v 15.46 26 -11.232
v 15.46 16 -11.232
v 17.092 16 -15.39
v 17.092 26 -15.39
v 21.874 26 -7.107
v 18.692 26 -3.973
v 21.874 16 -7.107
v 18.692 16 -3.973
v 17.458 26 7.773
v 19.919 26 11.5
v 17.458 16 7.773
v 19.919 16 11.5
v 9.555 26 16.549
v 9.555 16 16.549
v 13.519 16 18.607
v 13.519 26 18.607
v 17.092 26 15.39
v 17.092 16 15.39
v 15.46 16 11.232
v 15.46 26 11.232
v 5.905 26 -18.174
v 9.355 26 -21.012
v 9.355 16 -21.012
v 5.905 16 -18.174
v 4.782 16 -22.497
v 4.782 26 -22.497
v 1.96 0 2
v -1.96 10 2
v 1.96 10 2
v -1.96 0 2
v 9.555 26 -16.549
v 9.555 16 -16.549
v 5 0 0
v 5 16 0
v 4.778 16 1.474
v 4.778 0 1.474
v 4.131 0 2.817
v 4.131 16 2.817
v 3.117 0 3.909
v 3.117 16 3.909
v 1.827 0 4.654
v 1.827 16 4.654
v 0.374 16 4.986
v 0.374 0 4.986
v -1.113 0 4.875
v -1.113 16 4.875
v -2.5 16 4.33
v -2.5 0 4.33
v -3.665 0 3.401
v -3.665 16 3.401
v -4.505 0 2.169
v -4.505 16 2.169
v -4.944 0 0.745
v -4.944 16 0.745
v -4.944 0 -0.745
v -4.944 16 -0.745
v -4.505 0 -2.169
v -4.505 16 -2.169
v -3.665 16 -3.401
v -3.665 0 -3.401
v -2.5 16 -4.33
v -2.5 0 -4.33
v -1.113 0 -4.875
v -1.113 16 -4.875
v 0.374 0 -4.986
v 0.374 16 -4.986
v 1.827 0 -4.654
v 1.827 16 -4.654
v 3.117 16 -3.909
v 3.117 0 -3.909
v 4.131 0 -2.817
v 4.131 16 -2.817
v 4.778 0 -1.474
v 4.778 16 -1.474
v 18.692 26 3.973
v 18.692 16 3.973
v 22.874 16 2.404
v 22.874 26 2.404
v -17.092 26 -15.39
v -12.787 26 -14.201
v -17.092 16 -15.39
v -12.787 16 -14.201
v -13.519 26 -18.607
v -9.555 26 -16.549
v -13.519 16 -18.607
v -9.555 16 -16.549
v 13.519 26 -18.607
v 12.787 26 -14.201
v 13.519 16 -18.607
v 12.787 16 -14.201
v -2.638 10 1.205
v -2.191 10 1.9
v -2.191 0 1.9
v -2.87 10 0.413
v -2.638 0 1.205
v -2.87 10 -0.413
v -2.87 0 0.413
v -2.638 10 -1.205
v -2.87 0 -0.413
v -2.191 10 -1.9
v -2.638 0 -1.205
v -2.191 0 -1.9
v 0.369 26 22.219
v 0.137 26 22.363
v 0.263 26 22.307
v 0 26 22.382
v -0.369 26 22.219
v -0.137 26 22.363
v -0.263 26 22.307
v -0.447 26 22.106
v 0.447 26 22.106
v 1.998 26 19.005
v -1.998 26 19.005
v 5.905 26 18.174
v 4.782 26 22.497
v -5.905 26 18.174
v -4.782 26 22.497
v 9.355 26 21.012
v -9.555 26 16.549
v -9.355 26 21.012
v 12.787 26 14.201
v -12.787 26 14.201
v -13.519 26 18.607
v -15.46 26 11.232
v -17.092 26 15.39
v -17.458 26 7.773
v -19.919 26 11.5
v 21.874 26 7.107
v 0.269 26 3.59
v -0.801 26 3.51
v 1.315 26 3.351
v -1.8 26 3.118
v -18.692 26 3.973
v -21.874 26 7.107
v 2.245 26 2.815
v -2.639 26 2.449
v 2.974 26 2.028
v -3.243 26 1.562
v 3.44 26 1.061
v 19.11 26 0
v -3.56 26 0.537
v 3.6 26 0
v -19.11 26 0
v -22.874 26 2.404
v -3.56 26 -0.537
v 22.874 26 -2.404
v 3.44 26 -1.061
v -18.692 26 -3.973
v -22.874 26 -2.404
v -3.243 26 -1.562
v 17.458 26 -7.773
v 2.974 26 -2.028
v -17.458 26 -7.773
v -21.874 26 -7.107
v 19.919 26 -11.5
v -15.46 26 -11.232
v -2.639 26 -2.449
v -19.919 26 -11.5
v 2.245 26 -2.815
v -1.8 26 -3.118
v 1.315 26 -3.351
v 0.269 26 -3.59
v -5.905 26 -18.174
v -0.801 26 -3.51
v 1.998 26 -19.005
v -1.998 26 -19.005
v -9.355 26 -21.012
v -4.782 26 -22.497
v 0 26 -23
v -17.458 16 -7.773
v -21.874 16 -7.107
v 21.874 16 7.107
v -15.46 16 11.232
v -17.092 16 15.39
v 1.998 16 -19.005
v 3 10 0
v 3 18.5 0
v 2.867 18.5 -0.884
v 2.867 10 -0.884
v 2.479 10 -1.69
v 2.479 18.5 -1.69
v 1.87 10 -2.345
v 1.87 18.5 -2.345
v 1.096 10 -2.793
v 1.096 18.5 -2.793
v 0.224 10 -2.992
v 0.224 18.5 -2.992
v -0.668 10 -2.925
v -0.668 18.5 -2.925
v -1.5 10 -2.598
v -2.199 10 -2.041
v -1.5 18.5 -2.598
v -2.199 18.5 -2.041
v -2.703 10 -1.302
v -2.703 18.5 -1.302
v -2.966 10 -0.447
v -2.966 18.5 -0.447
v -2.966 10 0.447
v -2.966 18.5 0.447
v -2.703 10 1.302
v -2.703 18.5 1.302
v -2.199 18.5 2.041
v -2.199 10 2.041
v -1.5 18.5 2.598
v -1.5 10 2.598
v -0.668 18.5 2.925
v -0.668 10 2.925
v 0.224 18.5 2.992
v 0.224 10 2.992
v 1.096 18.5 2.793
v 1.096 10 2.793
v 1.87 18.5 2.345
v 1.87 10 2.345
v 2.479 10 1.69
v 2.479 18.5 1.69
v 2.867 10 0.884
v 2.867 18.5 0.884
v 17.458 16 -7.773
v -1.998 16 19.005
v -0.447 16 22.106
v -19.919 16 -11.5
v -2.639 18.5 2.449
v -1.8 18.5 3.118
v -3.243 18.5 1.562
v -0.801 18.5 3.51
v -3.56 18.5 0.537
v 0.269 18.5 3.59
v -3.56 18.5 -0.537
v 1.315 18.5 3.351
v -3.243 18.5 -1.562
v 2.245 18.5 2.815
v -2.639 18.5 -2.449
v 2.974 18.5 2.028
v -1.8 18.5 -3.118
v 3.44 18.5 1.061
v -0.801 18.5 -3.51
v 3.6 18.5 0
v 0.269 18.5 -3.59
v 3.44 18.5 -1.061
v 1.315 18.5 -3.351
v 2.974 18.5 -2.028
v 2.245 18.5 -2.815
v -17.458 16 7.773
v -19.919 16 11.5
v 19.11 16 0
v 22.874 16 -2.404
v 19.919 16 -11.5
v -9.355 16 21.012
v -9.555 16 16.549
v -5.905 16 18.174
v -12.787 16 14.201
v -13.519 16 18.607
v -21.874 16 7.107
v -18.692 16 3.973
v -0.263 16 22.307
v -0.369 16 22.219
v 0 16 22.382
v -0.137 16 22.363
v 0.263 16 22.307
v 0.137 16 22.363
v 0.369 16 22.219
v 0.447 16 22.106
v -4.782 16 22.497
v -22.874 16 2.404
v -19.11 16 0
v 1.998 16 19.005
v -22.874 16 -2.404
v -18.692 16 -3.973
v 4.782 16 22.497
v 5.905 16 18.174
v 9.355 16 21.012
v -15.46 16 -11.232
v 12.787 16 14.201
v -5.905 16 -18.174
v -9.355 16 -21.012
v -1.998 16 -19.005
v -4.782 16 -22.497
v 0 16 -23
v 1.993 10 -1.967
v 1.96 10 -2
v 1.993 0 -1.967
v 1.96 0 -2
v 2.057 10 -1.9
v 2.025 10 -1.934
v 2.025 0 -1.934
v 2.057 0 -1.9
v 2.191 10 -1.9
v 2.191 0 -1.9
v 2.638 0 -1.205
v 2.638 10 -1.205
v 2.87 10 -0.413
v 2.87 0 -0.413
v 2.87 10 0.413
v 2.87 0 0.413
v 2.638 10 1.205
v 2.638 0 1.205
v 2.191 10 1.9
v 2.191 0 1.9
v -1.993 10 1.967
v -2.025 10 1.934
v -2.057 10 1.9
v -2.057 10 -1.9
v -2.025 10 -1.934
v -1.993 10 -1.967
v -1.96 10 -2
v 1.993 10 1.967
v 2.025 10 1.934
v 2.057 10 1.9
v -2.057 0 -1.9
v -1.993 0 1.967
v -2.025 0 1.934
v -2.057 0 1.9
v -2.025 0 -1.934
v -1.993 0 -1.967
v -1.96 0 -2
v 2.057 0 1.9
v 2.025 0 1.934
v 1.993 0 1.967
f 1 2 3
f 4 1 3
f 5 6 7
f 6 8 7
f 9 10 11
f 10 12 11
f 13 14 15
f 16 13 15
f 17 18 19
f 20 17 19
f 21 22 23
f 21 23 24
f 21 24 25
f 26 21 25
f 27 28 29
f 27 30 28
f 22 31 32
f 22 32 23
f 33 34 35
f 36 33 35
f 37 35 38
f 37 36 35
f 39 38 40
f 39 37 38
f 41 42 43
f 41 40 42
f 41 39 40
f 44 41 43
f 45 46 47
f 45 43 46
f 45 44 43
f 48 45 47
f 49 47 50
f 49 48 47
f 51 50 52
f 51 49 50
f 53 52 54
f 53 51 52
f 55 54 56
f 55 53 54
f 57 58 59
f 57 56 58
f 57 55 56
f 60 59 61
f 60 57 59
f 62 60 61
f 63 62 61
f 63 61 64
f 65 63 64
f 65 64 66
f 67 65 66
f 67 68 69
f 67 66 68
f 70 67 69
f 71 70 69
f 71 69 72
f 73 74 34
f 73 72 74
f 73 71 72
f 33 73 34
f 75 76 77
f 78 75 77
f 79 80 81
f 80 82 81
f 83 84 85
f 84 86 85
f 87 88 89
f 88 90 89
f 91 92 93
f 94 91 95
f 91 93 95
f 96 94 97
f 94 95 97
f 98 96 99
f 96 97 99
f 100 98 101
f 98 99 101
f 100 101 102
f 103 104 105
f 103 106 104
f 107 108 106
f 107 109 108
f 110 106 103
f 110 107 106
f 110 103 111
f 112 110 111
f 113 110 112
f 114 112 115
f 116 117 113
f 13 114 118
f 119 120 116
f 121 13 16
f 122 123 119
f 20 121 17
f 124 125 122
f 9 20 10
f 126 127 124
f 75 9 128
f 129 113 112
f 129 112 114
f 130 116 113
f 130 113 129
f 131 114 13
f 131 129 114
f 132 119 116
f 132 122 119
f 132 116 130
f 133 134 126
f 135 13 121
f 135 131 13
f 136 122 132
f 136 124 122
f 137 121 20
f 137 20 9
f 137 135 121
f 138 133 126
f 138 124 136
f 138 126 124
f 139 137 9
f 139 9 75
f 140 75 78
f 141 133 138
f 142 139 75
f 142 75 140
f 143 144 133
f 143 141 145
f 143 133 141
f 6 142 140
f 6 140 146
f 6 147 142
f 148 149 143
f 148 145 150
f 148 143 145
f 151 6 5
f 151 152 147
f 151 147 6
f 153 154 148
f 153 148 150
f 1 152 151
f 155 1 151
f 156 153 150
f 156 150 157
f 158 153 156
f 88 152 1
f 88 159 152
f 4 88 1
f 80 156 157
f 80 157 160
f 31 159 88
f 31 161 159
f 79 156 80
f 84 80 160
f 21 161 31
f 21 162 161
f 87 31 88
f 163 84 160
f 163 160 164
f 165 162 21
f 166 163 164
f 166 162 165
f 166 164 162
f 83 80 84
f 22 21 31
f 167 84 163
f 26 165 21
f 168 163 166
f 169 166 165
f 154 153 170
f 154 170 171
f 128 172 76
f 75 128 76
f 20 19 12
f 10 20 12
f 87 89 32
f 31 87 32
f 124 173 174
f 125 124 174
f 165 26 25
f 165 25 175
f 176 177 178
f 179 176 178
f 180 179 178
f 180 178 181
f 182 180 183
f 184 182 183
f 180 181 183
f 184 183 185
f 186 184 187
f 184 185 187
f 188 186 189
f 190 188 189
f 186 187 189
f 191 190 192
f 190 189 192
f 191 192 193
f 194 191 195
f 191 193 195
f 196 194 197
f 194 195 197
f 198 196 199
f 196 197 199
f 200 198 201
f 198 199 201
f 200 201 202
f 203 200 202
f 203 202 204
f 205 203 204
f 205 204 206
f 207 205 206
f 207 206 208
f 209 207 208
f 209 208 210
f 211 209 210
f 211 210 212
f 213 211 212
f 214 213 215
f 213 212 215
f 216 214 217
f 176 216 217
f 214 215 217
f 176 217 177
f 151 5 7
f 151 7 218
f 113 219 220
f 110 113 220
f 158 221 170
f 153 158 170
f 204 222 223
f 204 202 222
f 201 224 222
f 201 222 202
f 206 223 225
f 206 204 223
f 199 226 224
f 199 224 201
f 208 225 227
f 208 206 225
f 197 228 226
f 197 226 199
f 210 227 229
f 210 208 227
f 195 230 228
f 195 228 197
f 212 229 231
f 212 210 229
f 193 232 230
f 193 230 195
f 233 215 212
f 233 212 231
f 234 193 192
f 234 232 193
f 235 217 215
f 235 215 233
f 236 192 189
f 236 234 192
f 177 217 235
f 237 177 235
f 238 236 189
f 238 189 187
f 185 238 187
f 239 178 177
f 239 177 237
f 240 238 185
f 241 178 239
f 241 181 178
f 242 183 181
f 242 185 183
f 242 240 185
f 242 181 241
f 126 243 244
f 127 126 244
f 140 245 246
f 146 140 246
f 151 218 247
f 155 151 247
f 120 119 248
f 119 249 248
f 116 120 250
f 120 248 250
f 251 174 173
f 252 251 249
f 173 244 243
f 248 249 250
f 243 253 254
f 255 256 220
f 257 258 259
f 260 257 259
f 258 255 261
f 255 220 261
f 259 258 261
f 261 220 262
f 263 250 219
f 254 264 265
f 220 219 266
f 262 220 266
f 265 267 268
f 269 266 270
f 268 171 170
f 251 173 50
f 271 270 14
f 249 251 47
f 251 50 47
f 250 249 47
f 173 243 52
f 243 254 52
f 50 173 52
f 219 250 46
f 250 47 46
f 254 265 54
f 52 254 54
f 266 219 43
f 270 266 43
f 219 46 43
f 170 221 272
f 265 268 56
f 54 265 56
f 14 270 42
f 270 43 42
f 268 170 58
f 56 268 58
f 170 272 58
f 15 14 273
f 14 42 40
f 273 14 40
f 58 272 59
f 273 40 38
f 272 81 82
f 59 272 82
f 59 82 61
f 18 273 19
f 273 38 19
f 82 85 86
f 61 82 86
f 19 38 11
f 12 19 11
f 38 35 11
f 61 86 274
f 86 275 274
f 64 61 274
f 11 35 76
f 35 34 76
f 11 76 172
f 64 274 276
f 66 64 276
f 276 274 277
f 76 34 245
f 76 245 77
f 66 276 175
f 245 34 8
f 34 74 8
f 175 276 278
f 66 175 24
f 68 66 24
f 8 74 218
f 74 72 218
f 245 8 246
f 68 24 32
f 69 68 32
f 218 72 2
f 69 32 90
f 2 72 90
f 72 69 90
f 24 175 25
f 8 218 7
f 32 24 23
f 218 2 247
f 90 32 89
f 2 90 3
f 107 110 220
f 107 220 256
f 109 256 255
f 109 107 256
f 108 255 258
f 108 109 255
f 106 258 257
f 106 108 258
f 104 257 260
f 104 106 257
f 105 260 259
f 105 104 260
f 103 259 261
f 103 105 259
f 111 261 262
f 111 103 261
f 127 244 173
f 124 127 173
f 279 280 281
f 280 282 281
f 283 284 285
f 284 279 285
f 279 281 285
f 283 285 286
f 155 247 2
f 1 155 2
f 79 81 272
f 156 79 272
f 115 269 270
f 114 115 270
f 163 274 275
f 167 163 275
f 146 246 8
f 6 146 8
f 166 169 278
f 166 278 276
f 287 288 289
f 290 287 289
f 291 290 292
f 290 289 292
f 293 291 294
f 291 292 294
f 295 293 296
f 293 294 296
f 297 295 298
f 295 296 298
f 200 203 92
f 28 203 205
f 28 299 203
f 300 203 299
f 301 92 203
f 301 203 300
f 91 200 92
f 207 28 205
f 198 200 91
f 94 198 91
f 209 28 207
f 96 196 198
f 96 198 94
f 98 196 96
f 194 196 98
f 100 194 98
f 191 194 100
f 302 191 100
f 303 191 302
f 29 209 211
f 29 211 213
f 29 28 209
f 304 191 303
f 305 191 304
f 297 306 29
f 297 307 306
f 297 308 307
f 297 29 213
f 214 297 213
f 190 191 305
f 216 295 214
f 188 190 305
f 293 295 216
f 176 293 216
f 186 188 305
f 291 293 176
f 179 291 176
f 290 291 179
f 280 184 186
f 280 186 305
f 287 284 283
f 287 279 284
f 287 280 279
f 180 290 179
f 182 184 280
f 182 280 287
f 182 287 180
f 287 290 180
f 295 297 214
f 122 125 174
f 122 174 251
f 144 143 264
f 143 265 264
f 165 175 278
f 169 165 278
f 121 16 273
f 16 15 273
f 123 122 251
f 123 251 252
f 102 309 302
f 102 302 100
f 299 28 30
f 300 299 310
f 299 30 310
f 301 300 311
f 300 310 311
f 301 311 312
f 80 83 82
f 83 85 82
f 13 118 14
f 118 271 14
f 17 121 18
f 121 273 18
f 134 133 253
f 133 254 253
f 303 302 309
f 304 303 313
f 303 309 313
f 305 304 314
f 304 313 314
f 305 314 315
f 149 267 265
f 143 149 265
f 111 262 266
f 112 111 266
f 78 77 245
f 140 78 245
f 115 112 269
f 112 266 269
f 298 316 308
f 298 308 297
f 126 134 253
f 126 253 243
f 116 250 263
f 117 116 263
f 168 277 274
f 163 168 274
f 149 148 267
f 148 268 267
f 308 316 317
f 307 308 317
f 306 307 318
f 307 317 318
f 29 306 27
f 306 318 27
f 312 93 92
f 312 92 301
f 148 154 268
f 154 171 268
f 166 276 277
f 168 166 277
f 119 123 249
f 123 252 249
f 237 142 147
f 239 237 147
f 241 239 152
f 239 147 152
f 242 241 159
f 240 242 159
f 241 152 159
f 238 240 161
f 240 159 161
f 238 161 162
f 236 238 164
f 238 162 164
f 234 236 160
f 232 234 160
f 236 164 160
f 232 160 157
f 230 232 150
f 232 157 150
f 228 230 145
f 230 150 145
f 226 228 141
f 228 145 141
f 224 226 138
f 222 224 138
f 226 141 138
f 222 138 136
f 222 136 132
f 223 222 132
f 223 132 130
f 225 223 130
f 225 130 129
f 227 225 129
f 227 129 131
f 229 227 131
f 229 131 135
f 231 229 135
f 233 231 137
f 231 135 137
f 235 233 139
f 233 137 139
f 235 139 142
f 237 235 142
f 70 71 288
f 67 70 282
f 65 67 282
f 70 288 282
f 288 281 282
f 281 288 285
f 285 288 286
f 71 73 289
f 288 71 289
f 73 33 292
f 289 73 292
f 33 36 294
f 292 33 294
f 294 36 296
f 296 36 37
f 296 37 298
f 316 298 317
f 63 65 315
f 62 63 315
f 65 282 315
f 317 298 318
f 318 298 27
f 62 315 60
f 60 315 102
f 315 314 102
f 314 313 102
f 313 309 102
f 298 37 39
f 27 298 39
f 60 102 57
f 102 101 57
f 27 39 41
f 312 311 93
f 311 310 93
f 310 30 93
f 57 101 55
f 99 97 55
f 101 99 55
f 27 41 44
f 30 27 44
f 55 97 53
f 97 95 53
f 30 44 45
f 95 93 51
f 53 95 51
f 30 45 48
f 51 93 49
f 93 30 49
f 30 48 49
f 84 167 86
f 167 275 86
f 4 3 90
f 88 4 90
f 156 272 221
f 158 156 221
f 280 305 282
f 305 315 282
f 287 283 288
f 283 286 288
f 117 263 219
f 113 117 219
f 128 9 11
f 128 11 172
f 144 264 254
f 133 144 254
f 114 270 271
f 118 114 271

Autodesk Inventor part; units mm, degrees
ref_plane "YZ Plane" through (0, 0, 0) normal (1, 0, 0) x (0, 1, 0)
ref_plane "XZ Plane" through (0, 0, 0) normal (0, 1, 0) x (-1, 0, 0)
ref_plane "XY Plane" through (0, 0, 0) normal (0, 0, 1) x (1, 0, 0)
sketch "Sketch1" plane through (0, 0, 0) normal (0, 1, 0) x (-1, 0, 0)
  line L0 (-2, 0) -> (2, 0)
  line L1 (-2, 0) -> (-2, 1)
  line L2 (-2, 1) -> (0, 0)
  line L3 (0, 0) -> (2, 1)
  line L4 (0, 0) -> (0, 19)
  line L5 (0, 19) -> (2, 19)
  line L6 (-2, 19) -> (0, 19)
  line L7 (0, 19) -> (0, 23)
  line L8 (0, 23) -> (-2, 19)
  line L9 (2, 19) -> (0, 23)
  line L10 (2, 0) -> (2, 19)
  line L11 (-2, 19) -> (-2, 0)
  point P0 (0, 41)
  dimension "d6" = 1
  dimension "d10" = 19
  dimension "d11" = 4
extrude "Extrusion1" add sketch "Sketch1" along normal blind 26 contours L3 L10 L0 | L4 L5 L10 L3 | L2 L11 L6 L4 | L7 L9 L5 | L6 L8 L7
pattern_circular "Circular Pattern1" count 30 over 360 about axis through (0, 0, 0) along (0, 1, 0) of "Extrusion1"
fillet "Fillet1" radius 0.5 1 edges at (0, 13, 23)
sketch "Sketch2" plane through (0, 26, 0) normal (0, 1, 0) x (1, 0, 0)
  circle A0 centre (0, 0) radius 1.5
  circle A1 centre (0, 0) radius 2.8
  line L0 (0, 0) -> (0, 1.9)
  line L1 (0, 1.9) -> (0, -1.9)
  line L2 (0, -1.9) -> (-2.0567, -1.9)
  line L3 (0, -1.9) -> (2.0567, -1.9)
  line L4 (0, 1.9) -> (2.0567, 1.9)
  line L5 (0, 1.9) -> (-2.0567, 1.9)
  circle A2 centre (0, 0) radius 3.6
  line L6 (0, 0) -> (0, 0.7)
  line L7 (0, 0) -> (0, -0.7)
  circle A3 centre (0, 0) radius 2.9
  line L8 (0, 0.7) -> (-2.8142, 0.7)
  line L9 (0, -0.7) -> (-2.8142, -0.7)
  line L10 (0, -0.7) -> (2.8142, -0.7)
  line L11 (0, 0.7) -> (2.8142, 0.7)
  circle A4 centre (0, 0) radius 5
  circle A5 centre (0, 0) radius 15
  circle A6 centre (0, 0) radius 30.1844
  line L12 (-2.0567, 1.9) -> (-2.1909, 1.9)
  line L13 (-2.1909, -1.9) -> (-2.0567, -1.9)
  line L14 (2.0567, -1.9) -> (2.1909, -1.9)
  line L15 (2.0567, 1.9) -> (2.1909, 1.9)
  line L16 (-1.0864, -1.9) -> (-1.0864, -2)
  line L17 (-1.0864, 1.9) -> (-1.0864, 2)
  line L18 (-1.0864, 2) -> (-2.1, 2)
  line L19 (-1.0864, 2) -> (2.1, 2)
  line L20 (-2.1, -2) -> (-1.0864, -2)
  line L21 (-1.0864, -2) -> (2.1, -2)
  circle A7 centre (0, 0) radius 3
  point P0 (1.9596, -2)
  point P1 (-1.9596, -2)
  point P2 (1.9596, 2)
  point P3 (-1.9596, 2)
  dimension "d30" = 5.8
  dimension "d13" = 3
  dimension "d19" = 5.6
  dimension "d20" = 1.9
  dimension "d21" = 3.8
  dimension "d27" = 7.2
  dimension "d28" = 0.7
  dimension "d29" = 0.7
  dimension "d37" = 10
  dimension "d38" = 30
  dimension "d43" = 0.1
  dimension "d44" = 0.1
  dimension "d47" = 6
extrude "Extrusion2" cut sketch "Sketch2" against normal blind 7.5 contours A0 L10 L1 L0 L11 | A0 L11 A1 L10 | L11 L0 A0 | A0 L0 L4 A1 L11 | L10 A1 L3 L1 A0 | A0 L1 L10 | L0 L8 A0 | A0 L8 A1 L5 L0 | L0 L1 L9 A0 L8 | L11 A3 L10 A1 | A1 L15 A3 L11 | L1 L2 A1 L9 A0 | A0 L9 L1 | L10 A3 L14 A1 | A0 L9 A1 L8 | L5 L17 L19 A1 L4 | A1 L19 A3 L15 | L3 A1 L21 L16 L2 | L14 A3 L21 A1 | L8 A3 L12 A1 | A1 L9 A3 L8 | L5 A1 L18 L17 | L19 L18 A1 | A1 L18 A3 L19 | A1 L13 A3 L9 | L16 L20 A1 L2 | L21 A3 L20 A1 | A1 L20 L21 | L12 A3 L18 A1 | A1 L20 A3 L13 | A2 | A7
pattern_circular "Circular Pattern2" [suppressed]
extrude "Extrusion4" cut sketch "Sketch2" against normal blind 8.5 from surface at -7.5 contours A0 L10 L1 L0 L11 | A0 L11 A1 L10 | L11 L0 A0 | A0 L0 L4 A1 L11 | L10 A1 L3 L1 A0 | A0 L1 L10 | L0 L8 A0 | A0 L8 A1 L5 L0 | L0 L1 L9 A0 L8 | L11 A3 L10 A1 | A1 L15 A3 L11 | L1 L2 A1 L9 A0 | A0 L9 L1 | L10 A3 L14 A1 | A0 L9 A1 L8 | L5 L17 L19 A1 L4 | A1 L19 A3 L15 | L3 A1 L21 L16 L2 | L14 A3 L21 A1 | L8 A3 L12 A1 | A1 L9 A3 L8 | L5 A1 L18 L17 | L19 L18 A1 | A1 L18 A3 L19 | A1 L13 A3 L9 | L16 L20 A1 L2 | L21 A3 L20 A1 | A1 L20 L21 | L12 A3 L18 A1 | A1 L20 A3 L13 | A7
extrude "Extrusion6" cut sketch "Sketch2" along normal blind 10 from surface at -26 contours A0 L10 L1 L0 L11 | A0 L11 A1 L10 | L11 L0 A0 | A0 L0 L4 A1 L11 | L10 A1 L3 L1 A0 | A0 L1 L10 | L0 L8 A0 | A0 L8 A1 L5 L0 | L0 L1 L9 A0 L8 | L11 A3 L10 A1 | A1 L15 A3 L11 | L1 L2 A1 L9 A0 | A0 L9 L1 | L10 A3 L14 A1 | A0 L9 A1 L8 | L5 L17 L19 A1 L4 | L3 A1 L21 L16 L2 | L8 A3 L12 A1 | A1 L9 A3 L8 | L5 A1 L18 L17 | A1 L13 A3 L9 | L16 L20 A1 L2
extrude "Extrusion9" cut sketch "Sketch2" along normal blind 16 from surface at -26 contours A5 | A6
properties part number "motor driven gear straight teeth for potentiometer"
